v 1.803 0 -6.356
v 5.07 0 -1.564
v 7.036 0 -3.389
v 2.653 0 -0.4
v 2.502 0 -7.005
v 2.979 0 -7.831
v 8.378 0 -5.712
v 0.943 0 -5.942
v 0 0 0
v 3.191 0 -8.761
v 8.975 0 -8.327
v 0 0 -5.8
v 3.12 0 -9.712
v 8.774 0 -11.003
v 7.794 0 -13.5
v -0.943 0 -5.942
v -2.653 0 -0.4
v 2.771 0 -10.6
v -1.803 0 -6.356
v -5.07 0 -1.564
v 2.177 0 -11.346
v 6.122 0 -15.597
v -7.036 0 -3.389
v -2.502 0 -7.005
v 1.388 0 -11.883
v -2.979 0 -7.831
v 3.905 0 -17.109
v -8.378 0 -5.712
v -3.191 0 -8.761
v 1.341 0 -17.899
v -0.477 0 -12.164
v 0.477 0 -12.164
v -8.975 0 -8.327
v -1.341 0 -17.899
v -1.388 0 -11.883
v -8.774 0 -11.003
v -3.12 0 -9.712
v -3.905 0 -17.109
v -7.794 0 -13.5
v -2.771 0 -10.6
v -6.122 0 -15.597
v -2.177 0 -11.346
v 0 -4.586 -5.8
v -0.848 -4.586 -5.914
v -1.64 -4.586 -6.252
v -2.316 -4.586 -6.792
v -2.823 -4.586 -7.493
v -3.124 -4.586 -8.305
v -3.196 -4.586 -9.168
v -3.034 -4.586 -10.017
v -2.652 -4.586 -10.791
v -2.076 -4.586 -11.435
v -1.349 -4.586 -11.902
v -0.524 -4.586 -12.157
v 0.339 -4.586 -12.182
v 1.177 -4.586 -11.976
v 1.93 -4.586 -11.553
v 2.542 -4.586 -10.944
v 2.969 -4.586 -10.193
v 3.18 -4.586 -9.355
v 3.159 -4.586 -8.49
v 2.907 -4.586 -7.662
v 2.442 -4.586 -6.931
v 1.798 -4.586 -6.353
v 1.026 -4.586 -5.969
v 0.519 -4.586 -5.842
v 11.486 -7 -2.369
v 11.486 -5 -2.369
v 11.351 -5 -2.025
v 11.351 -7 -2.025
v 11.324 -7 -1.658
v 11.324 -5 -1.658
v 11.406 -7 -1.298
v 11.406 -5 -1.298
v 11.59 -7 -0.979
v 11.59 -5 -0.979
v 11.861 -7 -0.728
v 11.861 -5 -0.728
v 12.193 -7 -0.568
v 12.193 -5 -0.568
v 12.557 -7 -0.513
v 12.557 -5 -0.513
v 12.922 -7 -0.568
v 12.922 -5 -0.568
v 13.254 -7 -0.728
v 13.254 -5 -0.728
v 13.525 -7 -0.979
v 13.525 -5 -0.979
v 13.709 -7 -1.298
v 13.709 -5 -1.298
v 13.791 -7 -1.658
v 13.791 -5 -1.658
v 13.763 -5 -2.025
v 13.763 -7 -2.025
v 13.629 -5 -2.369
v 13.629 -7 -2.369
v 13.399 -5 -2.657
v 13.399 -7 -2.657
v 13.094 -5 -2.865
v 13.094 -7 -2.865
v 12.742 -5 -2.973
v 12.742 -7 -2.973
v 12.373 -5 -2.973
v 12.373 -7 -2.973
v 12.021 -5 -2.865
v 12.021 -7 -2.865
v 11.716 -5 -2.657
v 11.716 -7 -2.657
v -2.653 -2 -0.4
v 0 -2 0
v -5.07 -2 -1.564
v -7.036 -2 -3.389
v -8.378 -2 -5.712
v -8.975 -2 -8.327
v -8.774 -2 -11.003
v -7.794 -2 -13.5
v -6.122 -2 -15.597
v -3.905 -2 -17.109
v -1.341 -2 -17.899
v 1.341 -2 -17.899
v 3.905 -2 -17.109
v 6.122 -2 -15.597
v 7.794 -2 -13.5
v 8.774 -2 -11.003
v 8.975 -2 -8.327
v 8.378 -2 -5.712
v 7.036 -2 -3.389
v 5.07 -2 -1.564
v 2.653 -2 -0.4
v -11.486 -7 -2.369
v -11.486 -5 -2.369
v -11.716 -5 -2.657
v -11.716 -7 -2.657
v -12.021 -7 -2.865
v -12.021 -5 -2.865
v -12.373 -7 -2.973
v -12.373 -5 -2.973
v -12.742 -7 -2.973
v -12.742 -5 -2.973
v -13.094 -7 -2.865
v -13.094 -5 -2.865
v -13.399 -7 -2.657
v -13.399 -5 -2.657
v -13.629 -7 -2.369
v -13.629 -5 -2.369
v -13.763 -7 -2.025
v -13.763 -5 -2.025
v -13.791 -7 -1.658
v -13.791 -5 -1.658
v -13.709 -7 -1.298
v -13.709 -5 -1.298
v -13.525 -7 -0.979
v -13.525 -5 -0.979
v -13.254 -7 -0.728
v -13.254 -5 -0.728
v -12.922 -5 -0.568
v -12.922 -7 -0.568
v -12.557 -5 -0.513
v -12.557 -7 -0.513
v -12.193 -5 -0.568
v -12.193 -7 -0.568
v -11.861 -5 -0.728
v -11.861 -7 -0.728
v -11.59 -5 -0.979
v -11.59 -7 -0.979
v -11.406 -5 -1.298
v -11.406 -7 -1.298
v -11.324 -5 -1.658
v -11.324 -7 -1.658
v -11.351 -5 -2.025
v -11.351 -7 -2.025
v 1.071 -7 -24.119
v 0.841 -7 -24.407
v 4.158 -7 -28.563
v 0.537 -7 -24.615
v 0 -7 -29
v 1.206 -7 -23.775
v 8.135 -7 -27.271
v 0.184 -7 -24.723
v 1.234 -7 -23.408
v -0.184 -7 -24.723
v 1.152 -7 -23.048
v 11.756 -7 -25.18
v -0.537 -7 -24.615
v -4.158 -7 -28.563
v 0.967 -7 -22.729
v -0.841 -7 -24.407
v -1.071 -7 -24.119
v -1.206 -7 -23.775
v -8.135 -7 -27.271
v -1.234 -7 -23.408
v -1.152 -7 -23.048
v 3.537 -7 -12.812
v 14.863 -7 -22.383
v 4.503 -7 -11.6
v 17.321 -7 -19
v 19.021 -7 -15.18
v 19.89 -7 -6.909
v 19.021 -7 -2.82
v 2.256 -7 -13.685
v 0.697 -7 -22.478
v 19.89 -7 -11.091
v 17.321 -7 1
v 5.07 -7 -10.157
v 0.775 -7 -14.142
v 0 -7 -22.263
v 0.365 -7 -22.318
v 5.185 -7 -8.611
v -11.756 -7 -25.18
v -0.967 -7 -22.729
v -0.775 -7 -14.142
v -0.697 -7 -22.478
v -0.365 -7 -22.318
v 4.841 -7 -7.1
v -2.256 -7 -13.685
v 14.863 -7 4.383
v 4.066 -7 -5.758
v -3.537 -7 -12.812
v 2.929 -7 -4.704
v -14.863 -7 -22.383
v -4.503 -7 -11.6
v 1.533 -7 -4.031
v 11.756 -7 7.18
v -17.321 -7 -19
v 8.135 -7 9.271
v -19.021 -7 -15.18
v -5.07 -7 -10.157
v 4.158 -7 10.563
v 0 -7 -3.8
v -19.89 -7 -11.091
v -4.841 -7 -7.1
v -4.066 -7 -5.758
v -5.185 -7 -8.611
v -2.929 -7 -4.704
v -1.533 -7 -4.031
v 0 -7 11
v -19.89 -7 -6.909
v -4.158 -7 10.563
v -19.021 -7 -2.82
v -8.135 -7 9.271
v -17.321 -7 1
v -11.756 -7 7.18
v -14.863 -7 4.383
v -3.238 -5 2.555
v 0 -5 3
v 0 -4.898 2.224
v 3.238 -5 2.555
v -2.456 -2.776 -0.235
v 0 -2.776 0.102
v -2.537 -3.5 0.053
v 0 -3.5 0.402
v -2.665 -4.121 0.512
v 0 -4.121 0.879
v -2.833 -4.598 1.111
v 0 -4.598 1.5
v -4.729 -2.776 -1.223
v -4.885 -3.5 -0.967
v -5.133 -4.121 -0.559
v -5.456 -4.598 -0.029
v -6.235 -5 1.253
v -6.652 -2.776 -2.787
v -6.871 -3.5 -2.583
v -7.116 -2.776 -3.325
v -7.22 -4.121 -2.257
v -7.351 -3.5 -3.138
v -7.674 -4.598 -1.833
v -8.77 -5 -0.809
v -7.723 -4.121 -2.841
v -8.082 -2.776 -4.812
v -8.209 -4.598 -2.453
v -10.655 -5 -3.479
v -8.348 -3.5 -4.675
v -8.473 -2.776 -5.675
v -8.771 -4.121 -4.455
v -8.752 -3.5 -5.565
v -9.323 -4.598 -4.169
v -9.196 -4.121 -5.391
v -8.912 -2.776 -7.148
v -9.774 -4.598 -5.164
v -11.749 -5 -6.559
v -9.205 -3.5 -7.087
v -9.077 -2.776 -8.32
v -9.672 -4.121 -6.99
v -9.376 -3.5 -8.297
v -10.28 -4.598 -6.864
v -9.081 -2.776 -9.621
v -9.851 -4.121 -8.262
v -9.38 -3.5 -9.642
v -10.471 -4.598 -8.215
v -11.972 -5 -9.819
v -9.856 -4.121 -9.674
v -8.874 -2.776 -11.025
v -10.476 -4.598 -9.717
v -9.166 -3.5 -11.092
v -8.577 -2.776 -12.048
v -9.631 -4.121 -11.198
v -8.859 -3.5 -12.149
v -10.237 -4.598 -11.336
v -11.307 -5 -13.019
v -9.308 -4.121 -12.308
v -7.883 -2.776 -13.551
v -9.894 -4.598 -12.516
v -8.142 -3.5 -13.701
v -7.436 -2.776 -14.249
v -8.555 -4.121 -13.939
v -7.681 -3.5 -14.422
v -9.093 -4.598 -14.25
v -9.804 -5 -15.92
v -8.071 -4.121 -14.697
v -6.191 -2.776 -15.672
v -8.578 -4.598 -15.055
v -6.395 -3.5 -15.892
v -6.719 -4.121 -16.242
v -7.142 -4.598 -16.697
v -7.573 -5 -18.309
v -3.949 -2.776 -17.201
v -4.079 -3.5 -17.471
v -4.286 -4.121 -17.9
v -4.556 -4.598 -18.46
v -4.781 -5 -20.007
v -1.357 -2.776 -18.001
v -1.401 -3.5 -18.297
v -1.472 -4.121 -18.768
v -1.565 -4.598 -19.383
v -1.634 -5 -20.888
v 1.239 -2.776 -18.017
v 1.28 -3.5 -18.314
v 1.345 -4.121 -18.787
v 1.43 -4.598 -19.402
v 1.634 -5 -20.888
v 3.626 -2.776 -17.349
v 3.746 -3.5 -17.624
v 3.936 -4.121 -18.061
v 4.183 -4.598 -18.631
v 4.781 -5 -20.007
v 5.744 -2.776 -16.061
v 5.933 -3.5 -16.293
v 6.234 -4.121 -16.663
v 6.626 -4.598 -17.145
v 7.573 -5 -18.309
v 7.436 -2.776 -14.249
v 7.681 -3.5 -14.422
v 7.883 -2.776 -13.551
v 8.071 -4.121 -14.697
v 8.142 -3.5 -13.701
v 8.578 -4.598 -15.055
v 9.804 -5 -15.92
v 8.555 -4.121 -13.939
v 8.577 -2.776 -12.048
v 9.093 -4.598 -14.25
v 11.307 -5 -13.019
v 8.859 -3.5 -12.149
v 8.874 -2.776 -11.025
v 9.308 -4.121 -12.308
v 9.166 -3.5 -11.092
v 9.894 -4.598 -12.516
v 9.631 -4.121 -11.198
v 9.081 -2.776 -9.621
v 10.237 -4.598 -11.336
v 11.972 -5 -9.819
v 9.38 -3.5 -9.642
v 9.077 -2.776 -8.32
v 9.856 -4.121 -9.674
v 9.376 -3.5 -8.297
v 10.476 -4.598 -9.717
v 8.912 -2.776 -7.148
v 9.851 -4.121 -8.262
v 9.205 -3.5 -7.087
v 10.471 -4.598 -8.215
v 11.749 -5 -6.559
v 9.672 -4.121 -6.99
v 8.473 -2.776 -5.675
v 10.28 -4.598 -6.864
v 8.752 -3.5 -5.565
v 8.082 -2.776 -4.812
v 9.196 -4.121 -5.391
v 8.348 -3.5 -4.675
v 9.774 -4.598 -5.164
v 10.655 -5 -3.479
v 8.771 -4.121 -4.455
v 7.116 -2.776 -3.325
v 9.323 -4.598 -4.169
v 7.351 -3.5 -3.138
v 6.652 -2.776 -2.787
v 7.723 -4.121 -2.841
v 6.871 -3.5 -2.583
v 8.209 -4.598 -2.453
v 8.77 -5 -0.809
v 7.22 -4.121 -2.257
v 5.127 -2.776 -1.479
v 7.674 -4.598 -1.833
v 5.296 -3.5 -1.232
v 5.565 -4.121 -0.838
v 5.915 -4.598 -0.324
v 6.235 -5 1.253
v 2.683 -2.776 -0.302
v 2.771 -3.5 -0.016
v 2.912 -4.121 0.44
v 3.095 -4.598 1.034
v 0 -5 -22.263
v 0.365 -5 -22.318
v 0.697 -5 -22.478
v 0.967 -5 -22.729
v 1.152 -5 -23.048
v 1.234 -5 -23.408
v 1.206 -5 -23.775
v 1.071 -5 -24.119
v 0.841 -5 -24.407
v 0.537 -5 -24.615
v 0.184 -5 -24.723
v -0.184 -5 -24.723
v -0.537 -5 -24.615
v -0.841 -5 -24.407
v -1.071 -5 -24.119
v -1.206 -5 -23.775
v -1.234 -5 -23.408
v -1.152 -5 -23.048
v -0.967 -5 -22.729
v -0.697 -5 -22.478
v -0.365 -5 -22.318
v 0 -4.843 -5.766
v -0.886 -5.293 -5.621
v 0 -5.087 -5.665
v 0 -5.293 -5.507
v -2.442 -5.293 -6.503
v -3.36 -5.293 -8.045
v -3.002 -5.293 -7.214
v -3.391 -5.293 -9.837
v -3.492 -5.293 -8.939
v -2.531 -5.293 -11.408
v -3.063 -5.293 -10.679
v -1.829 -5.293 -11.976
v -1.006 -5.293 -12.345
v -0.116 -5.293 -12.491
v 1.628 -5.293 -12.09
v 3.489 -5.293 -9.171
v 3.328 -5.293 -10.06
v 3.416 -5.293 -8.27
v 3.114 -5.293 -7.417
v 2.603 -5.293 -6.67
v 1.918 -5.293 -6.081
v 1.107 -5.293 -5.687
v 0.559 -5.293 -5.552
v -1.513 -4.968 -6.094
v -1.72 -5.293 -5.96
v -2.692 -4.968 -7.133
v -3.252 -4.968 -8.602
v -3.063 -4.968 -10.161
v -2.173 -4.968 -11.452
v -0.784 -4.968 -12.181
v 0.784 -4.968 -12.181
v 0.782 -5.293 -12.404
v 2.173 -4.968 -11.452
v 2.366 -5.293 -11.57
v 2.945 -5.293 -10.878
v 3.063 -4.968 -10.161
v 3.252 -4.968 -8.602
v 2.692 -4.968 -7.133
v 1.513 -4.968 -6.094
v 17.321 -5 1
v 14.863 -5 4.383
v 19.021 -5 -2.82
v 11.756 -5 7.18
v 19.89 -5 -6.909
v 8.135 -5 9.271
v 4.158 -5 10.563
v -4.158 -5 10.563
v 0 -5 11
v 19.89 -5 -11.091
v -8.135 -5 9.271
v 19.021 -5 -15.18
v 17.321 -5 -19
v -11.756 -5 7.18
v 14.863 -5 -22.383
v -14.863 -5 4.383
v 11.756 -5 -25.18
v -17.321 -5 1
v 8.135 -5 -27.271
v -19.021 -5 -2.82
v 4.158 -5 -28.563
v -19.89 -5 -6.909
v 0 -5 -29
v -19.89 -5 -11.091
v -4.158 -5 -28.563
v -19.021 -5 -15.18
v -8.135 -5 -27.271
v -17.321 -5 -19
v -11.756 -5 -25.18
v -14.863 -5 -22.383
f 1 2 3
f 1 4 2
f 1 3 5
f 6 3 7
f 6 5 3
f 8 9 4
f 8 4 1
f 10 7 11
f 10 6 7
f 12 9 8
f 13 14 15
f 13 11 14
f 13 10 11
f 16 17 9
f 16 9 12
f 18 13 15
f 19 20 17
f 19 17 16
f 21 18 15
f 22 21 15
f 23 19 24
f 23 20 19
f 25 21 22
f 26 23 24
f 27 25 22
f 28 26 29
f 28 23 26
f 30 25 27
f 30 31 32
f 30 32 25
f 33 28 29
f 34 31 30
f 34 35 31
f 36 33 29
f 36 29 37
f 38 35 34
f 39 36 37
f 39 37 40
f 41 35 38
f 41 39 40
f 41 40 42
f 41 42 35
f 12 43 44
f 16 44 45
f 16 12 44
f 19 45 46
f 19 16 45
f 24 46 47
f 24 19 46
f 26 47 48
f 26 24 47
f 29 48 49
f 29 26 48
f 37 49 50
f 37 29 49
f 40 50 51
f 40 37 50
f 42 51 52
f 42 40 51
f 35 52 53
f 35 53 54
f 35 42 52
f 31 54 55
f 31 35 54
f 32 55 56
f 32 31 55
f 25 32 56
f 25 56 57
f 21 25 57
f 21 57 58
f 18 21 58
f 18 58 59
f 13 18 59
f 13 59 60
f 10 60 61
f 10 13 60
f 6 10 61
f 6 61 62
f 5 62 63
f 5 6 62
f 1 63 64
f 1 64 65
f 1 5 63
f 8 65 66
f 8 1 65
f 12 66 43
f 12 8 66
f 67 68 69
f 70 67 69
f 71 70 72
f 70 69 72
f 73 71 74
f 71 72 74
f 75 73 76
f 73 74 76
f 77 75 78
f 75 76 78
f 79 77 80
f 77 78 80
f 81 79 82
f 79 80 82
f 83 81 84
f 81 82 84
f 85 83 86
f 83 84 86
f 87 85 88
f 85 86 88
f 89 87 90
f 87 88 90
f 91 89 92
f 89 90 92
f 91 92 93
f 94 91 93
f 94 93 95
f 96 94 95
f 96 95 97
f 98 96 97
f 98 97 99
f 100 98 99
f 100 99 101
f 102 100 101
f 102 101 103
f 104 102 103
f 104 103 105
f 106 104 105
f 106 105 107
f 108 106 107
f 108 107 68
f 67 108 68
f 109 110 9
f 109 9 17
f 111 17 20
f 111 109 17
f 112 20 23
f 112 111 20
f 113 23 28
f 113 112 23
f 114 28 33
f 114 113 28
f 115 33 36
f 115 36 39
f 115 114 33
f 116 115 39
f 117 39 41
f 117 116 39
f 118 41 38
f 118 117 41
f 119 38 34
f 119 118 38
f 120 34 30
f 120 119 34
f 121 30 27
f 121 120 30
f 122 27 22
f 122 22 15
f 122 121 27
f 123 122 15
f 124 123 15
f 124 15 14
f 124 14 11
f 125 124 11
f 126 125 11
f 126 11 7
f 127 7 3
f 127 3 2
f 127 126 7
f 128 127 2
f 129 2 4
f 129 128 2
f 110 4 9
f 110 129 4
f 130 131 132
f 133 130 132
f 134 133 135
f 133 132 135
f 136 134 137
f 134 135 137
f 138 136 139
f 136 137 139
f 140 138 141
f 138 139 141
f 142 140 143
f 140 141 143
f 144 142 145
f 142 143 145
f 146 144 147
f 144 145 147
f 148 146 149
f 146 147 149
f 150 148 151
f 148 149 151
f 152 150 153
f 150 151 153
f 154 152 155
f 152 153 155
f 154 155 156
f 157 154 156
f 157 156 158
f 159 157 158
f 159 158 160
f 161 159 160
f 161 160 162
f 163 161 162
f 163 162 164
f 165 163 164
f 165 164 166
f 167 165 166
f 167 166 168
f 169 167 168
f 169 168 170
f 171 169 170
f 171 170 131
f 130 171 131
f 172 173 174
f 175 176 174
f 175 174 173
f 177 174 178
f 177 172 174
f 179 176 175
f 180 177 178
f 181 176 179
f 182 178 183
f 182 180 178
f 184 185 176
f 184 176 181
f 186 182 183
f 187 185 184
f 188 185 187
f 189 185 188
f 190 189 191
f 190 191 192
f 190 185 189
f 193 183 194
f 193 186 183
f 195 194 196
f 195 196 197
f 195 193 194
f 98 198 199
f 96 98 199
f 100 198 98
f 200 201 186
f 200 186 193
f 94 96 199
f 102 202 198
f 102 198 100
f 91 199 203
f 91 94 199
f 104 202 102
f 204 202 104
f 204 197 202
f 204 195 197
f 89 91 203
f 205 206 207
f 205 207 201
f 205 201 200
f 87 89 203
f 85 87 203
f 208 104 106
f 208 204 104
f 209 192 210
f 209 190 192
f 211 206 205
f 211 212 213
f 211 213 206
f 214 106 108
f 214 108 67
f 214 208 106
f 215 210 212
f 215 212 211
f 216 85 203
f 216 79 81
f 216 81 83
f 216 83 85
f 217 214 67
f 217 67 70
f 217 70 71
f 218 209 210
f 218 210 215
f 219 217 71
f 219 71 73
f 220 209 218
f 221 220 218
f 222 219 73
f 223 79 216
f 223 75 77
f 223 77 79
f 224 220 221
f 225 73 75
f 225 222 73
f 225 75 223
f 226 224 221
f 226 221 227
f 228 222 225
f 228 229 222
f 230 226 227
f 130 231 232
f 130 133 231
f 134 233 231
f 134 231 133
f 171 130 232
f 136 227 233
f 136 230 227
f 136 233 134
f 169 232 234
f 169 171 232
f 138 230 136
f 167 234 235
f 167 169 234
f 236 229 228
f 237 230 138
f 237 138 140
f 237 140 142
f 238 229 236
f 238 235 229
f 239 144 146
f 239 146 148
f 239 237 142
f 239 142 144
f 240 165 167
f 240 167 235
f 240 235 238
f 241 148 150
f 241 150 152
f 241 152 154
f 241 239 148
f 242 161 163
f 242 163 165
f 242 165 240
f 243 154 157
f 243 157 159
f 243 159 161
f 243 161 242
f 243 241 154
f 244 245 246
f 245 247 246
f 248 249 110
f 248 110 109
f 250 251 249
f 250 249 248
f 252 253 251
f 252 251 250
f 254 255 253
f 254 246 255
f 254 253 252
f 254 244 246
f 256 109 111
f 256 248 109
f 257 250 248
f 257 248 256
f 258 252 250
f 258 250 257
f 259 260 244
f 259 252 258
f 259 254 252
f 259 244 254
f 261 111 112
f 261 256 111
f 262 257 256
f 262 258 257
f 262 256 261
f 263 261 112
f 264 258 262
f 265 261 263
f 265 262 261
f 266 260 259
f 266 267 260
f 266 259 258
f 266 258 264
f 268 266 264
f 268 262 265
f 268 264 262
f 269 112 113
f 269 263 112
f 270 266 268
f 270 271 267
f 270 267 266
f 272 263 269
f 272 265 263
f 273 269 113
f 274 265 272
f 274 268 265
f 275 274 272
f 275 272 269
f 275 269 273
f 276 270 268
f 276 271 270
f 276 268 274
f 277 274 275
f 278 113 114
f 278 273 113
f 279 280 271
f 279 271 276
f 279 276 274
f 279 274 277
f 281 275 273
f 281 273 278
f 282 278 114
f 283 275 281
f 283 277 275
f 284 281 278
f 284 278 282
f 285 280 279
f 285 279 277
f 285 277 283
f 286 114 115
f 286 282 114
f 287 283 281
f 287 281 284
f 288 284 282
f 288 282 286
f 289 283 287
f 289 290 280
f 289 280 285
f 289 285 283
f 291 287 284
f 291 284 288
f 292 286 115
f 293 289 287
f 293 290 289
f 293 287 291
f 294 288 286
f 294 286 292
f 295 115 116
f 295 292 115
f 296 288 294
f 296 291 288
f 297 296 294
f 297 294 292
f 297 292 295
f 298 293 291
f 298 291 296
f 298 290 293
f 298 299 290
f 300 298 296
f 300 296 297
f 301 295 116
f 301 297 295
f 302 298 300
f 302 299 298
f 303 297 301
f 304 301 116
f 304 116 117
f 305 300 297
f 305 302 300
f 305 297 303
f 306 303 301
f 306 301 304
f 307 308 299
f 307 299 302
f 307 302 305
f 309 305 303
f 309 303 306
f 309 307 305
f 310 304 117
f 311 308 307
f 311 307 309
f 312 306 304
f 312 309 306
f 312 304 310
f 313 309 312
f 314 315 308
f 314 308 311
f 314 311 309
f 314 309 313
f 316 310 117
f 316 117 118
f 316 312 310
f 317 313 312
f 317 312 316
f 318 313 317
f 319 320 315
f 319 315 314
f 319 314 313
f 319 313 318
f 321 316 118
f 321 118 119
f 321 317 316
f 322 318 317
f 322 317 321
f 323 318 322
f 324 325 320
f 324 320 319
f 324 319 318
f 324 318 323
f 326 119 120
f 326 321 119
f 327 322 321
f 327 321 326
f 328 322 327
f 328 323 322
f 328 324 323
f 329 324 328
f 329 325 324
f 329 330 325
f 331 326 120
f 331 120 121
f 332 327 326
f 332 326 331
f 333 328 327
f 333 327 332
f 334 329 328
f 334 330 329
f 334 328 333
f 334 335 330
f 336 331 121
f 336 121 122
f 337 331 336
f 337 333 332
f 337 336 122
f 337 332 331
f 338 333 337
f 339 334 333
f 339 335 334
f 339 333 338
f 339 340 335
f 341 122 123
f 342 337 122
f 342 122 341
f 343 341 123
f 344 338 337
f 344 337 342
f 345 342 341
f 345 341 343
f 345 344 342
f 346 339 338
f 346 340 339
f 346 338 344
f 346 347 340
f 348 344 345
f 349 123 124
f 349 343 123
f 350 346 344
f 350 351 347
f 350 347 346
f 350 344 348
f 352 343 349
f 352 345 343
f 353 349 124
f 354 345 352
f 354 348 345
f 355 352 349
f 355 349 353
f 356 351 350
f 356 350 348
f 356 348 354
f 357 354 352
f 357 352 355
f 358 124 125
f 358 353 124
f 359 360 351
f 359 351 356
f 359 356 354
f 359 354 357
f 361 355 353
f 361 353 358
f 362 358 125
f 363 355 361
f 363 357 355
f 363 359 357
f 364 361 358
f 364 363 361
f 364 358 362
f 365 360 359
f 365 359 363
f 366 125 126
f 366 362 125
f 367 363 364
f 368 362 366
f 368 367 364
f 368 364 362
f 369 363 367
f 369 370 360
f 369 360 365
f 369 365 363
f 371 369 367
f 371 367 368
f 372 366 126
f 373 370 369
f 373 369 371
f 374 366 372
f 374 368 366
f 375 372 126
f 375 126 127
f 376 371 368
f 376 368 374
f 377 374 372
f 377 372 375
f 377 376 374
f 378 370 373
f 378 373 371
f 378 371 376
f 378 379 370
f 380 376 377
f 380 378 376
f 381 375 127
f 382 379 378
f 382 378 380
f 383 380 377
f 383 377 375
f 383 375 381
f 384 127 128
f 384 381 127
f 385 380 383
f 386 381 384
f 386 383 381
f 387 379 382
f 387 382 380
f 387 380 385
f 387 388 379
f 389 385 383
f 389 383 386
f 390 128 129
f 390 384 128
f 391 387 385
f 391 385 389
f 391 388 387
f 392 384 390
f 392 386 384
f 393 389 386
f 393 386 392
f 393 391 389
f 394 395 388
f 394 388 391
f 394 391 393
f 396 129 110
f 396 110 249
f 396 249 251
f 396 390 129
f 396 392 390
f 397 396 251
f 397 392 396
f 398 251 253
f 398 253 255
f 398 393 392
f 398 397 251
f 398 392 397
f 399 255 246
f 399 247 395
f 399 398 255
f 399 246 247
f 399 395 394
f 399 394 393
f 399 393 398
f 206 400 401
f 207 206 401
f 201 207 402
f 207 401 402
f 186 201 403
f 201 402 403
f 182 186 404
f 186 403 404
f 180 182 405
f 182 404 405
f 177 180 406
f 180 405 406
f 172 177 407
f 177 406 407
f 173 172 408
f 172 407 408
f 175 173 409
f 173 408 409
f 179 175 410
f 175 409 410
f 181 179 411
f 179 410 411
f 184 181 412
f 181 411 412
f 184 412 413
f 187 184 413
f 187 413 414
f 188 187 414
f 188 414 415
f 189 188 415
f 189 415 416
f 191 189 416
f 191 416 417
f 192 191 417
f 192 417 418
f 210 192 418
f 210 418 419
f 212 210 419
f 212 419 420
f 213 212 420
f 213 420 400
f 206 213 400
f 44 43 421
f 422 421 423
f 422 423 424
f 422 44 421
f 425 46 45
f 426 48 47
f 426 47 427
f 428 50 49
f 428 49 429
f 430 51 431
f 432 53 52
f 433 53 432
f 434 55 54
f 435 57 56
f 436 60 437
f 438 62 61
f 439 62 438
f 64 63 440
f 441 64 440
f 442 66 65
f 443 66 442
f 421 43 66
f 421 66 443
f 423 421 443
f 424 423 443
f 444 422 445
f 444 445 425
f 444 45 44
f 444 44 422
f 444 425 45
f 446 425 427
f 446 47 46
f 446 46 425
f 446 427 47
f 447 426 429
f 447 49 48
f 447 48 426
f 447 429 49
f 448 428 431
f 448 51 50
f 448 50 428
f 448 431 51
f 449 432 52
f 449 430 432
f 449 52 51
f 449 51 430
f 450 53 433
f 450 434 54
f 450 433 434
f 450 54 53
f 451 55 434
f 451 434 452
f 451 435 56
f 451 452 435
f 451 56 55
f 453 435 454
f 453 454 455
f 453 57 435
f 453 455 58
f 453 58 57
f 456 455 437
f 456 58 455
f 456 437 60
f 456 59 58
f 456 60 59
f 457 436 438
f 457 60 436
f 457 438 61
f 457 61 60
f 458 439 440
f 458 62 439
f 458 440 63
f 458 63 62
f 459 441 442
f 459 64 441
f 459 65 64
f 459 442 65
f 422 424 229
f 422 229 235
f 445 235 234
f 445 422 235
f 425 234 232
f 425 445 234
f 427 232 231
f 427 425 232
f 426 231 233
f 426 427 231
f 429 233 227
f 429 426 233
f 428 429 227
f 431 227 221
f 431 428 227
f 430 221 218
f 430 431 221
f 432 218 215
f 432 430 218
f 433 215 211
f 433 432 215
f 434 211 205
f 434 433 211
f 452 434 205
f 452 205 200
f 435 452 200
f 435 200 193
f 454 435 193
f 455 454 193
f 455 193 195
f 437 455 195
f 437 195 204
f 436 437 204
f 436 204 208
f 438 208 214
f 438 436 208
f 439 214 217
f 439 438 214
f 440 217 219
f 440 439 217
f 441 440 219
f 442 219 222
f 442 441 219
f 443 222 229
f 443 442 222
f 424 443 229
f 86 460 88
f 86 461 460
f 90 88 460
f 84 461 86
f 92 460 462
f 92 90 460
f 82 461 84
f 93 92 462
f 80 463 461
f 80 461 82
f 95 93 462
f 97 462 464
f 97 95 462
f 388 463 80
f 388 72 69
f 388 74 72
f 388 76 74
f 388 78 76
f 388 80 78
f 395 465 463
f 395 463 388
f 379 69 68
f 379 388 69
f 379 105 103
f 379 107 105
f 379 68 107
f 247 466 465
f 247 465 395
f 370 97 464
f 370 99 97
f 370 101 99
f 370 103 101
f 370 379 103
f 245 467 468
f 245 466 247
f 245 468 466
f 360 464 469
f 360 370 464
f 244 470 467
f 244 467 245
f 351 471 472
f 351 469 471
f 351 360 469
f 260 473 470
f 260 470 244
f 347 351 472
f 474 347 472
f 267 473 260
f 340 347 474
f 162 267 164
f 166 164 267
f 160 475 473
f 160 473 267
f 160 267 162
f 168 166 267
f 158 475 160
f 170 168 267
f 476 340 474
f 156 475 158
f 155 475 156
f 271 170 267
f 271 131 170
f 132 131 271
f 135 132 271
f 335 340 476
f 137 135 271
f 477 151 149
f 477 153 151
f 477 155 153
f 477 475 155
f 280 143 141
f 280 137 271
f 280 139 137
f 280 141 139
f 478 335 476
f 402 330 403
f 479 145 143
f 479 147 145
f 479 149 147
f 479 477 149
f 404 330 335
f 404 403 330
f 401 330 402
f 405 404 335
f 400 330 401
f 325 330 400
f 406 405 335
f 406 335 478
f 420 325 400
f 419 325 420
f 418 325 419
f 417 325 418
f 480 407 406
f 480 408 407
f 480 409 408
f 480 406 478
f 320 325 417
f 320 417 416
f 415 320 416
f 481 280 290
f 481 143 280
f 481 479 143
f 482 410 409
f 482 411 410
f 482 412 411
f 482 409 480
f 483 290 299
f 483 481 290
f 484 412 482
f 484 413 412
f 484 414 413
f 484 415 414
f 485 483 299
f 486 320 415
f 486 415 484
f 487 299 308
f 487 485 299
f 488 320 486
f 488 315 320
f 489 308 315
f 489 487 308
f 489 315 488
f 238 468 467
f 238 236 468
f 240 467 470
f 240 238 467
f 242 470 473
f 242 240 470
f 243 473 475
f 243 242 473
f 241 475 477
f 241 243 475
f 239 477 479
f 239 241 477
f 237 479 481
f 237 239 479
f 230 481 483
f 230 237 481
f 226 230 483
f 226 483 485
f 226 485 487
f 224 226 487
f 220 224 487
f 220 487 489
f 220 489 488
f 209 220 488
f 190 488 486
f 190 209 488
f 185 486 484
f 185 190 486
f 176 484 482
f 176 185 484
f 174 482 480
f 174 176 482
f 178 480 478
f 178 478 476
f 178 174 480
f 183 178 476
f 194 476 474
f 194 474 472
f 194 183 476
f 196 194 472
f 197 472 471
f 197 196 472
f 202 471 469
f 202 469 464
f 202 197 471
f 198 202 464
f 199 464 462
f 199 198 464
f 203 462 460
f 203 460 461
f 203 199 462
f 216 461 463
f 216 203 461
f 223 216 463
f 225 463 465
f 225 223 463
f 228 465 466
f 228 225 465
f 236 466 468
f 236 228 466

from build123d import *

# Parameters (mm, degrees)
SKETCH2_R          = 1.237013061
CUT_EXTRUDE1_DEPTH = 36.580893749
CIRPATTERN1_COUNT  = 3
FILLET2_R          = 3
FILLET3_R          = 1


with BuildPart() as part:
    # Sketch1 → Revolve1 (revolve)
    with BuildSketch(Plane(origin=(0, 0, 0), x_dir=(0, 0, -1), z_dir=(1, 0, 0))):
        Polygon((0, 0), (0, -5), (-11, -5), (-11, -7), (3.8, -7), (5.8, -5), (5.8, 0), align=None)
    revolve(axis=Axis((0, 1.658614865, -9), (0, -1, 0)))

    # Sketch2 → Cut-Extrude1 (cut, through all)
    with BuildSketch(Plane(origin=(0, -5, 0), x_dir=(1, 0, 0), z_dir=(0, 1, 0))):
        with Locations(Location((0, 23.5, 0), (0, 0, 270))):
            Circle(SKETCH2_R)
    cut_extrude1 = extrude(amount=-CUT_EXTRUDE1_DEPTH, mode=Mode.SUBTRACT)

    # CirPattern1: Cut-Extrude1 ×3 about axis
    cirpattern1_axis = Axis((0, 0, -9), (0, 1, 0))
    for i in range(1, CIRPATTERN1_COUNT):
        add(cut_extrude1.rotate(cirpattern1_axis, i * 360 / CIRPATTERN1_COUNT), mode=Mode.SUBTRACT)

    # Fillet2
    fillet2_edges = [part.edges().sort_by_distance(p)[0] for p in [
        (0, -5, -18),
    ]]
    fillet(fillet2_edges, radius=FILLET2_R)

    # Fillet3
    fillet3_edges = [part.edges().sort_by_distance(p)[0] for p in [
        (0, -5, -12.2),
    ]]
    fillet(fillet3_edges, radius=FILLET3_R)


solid = part.part
